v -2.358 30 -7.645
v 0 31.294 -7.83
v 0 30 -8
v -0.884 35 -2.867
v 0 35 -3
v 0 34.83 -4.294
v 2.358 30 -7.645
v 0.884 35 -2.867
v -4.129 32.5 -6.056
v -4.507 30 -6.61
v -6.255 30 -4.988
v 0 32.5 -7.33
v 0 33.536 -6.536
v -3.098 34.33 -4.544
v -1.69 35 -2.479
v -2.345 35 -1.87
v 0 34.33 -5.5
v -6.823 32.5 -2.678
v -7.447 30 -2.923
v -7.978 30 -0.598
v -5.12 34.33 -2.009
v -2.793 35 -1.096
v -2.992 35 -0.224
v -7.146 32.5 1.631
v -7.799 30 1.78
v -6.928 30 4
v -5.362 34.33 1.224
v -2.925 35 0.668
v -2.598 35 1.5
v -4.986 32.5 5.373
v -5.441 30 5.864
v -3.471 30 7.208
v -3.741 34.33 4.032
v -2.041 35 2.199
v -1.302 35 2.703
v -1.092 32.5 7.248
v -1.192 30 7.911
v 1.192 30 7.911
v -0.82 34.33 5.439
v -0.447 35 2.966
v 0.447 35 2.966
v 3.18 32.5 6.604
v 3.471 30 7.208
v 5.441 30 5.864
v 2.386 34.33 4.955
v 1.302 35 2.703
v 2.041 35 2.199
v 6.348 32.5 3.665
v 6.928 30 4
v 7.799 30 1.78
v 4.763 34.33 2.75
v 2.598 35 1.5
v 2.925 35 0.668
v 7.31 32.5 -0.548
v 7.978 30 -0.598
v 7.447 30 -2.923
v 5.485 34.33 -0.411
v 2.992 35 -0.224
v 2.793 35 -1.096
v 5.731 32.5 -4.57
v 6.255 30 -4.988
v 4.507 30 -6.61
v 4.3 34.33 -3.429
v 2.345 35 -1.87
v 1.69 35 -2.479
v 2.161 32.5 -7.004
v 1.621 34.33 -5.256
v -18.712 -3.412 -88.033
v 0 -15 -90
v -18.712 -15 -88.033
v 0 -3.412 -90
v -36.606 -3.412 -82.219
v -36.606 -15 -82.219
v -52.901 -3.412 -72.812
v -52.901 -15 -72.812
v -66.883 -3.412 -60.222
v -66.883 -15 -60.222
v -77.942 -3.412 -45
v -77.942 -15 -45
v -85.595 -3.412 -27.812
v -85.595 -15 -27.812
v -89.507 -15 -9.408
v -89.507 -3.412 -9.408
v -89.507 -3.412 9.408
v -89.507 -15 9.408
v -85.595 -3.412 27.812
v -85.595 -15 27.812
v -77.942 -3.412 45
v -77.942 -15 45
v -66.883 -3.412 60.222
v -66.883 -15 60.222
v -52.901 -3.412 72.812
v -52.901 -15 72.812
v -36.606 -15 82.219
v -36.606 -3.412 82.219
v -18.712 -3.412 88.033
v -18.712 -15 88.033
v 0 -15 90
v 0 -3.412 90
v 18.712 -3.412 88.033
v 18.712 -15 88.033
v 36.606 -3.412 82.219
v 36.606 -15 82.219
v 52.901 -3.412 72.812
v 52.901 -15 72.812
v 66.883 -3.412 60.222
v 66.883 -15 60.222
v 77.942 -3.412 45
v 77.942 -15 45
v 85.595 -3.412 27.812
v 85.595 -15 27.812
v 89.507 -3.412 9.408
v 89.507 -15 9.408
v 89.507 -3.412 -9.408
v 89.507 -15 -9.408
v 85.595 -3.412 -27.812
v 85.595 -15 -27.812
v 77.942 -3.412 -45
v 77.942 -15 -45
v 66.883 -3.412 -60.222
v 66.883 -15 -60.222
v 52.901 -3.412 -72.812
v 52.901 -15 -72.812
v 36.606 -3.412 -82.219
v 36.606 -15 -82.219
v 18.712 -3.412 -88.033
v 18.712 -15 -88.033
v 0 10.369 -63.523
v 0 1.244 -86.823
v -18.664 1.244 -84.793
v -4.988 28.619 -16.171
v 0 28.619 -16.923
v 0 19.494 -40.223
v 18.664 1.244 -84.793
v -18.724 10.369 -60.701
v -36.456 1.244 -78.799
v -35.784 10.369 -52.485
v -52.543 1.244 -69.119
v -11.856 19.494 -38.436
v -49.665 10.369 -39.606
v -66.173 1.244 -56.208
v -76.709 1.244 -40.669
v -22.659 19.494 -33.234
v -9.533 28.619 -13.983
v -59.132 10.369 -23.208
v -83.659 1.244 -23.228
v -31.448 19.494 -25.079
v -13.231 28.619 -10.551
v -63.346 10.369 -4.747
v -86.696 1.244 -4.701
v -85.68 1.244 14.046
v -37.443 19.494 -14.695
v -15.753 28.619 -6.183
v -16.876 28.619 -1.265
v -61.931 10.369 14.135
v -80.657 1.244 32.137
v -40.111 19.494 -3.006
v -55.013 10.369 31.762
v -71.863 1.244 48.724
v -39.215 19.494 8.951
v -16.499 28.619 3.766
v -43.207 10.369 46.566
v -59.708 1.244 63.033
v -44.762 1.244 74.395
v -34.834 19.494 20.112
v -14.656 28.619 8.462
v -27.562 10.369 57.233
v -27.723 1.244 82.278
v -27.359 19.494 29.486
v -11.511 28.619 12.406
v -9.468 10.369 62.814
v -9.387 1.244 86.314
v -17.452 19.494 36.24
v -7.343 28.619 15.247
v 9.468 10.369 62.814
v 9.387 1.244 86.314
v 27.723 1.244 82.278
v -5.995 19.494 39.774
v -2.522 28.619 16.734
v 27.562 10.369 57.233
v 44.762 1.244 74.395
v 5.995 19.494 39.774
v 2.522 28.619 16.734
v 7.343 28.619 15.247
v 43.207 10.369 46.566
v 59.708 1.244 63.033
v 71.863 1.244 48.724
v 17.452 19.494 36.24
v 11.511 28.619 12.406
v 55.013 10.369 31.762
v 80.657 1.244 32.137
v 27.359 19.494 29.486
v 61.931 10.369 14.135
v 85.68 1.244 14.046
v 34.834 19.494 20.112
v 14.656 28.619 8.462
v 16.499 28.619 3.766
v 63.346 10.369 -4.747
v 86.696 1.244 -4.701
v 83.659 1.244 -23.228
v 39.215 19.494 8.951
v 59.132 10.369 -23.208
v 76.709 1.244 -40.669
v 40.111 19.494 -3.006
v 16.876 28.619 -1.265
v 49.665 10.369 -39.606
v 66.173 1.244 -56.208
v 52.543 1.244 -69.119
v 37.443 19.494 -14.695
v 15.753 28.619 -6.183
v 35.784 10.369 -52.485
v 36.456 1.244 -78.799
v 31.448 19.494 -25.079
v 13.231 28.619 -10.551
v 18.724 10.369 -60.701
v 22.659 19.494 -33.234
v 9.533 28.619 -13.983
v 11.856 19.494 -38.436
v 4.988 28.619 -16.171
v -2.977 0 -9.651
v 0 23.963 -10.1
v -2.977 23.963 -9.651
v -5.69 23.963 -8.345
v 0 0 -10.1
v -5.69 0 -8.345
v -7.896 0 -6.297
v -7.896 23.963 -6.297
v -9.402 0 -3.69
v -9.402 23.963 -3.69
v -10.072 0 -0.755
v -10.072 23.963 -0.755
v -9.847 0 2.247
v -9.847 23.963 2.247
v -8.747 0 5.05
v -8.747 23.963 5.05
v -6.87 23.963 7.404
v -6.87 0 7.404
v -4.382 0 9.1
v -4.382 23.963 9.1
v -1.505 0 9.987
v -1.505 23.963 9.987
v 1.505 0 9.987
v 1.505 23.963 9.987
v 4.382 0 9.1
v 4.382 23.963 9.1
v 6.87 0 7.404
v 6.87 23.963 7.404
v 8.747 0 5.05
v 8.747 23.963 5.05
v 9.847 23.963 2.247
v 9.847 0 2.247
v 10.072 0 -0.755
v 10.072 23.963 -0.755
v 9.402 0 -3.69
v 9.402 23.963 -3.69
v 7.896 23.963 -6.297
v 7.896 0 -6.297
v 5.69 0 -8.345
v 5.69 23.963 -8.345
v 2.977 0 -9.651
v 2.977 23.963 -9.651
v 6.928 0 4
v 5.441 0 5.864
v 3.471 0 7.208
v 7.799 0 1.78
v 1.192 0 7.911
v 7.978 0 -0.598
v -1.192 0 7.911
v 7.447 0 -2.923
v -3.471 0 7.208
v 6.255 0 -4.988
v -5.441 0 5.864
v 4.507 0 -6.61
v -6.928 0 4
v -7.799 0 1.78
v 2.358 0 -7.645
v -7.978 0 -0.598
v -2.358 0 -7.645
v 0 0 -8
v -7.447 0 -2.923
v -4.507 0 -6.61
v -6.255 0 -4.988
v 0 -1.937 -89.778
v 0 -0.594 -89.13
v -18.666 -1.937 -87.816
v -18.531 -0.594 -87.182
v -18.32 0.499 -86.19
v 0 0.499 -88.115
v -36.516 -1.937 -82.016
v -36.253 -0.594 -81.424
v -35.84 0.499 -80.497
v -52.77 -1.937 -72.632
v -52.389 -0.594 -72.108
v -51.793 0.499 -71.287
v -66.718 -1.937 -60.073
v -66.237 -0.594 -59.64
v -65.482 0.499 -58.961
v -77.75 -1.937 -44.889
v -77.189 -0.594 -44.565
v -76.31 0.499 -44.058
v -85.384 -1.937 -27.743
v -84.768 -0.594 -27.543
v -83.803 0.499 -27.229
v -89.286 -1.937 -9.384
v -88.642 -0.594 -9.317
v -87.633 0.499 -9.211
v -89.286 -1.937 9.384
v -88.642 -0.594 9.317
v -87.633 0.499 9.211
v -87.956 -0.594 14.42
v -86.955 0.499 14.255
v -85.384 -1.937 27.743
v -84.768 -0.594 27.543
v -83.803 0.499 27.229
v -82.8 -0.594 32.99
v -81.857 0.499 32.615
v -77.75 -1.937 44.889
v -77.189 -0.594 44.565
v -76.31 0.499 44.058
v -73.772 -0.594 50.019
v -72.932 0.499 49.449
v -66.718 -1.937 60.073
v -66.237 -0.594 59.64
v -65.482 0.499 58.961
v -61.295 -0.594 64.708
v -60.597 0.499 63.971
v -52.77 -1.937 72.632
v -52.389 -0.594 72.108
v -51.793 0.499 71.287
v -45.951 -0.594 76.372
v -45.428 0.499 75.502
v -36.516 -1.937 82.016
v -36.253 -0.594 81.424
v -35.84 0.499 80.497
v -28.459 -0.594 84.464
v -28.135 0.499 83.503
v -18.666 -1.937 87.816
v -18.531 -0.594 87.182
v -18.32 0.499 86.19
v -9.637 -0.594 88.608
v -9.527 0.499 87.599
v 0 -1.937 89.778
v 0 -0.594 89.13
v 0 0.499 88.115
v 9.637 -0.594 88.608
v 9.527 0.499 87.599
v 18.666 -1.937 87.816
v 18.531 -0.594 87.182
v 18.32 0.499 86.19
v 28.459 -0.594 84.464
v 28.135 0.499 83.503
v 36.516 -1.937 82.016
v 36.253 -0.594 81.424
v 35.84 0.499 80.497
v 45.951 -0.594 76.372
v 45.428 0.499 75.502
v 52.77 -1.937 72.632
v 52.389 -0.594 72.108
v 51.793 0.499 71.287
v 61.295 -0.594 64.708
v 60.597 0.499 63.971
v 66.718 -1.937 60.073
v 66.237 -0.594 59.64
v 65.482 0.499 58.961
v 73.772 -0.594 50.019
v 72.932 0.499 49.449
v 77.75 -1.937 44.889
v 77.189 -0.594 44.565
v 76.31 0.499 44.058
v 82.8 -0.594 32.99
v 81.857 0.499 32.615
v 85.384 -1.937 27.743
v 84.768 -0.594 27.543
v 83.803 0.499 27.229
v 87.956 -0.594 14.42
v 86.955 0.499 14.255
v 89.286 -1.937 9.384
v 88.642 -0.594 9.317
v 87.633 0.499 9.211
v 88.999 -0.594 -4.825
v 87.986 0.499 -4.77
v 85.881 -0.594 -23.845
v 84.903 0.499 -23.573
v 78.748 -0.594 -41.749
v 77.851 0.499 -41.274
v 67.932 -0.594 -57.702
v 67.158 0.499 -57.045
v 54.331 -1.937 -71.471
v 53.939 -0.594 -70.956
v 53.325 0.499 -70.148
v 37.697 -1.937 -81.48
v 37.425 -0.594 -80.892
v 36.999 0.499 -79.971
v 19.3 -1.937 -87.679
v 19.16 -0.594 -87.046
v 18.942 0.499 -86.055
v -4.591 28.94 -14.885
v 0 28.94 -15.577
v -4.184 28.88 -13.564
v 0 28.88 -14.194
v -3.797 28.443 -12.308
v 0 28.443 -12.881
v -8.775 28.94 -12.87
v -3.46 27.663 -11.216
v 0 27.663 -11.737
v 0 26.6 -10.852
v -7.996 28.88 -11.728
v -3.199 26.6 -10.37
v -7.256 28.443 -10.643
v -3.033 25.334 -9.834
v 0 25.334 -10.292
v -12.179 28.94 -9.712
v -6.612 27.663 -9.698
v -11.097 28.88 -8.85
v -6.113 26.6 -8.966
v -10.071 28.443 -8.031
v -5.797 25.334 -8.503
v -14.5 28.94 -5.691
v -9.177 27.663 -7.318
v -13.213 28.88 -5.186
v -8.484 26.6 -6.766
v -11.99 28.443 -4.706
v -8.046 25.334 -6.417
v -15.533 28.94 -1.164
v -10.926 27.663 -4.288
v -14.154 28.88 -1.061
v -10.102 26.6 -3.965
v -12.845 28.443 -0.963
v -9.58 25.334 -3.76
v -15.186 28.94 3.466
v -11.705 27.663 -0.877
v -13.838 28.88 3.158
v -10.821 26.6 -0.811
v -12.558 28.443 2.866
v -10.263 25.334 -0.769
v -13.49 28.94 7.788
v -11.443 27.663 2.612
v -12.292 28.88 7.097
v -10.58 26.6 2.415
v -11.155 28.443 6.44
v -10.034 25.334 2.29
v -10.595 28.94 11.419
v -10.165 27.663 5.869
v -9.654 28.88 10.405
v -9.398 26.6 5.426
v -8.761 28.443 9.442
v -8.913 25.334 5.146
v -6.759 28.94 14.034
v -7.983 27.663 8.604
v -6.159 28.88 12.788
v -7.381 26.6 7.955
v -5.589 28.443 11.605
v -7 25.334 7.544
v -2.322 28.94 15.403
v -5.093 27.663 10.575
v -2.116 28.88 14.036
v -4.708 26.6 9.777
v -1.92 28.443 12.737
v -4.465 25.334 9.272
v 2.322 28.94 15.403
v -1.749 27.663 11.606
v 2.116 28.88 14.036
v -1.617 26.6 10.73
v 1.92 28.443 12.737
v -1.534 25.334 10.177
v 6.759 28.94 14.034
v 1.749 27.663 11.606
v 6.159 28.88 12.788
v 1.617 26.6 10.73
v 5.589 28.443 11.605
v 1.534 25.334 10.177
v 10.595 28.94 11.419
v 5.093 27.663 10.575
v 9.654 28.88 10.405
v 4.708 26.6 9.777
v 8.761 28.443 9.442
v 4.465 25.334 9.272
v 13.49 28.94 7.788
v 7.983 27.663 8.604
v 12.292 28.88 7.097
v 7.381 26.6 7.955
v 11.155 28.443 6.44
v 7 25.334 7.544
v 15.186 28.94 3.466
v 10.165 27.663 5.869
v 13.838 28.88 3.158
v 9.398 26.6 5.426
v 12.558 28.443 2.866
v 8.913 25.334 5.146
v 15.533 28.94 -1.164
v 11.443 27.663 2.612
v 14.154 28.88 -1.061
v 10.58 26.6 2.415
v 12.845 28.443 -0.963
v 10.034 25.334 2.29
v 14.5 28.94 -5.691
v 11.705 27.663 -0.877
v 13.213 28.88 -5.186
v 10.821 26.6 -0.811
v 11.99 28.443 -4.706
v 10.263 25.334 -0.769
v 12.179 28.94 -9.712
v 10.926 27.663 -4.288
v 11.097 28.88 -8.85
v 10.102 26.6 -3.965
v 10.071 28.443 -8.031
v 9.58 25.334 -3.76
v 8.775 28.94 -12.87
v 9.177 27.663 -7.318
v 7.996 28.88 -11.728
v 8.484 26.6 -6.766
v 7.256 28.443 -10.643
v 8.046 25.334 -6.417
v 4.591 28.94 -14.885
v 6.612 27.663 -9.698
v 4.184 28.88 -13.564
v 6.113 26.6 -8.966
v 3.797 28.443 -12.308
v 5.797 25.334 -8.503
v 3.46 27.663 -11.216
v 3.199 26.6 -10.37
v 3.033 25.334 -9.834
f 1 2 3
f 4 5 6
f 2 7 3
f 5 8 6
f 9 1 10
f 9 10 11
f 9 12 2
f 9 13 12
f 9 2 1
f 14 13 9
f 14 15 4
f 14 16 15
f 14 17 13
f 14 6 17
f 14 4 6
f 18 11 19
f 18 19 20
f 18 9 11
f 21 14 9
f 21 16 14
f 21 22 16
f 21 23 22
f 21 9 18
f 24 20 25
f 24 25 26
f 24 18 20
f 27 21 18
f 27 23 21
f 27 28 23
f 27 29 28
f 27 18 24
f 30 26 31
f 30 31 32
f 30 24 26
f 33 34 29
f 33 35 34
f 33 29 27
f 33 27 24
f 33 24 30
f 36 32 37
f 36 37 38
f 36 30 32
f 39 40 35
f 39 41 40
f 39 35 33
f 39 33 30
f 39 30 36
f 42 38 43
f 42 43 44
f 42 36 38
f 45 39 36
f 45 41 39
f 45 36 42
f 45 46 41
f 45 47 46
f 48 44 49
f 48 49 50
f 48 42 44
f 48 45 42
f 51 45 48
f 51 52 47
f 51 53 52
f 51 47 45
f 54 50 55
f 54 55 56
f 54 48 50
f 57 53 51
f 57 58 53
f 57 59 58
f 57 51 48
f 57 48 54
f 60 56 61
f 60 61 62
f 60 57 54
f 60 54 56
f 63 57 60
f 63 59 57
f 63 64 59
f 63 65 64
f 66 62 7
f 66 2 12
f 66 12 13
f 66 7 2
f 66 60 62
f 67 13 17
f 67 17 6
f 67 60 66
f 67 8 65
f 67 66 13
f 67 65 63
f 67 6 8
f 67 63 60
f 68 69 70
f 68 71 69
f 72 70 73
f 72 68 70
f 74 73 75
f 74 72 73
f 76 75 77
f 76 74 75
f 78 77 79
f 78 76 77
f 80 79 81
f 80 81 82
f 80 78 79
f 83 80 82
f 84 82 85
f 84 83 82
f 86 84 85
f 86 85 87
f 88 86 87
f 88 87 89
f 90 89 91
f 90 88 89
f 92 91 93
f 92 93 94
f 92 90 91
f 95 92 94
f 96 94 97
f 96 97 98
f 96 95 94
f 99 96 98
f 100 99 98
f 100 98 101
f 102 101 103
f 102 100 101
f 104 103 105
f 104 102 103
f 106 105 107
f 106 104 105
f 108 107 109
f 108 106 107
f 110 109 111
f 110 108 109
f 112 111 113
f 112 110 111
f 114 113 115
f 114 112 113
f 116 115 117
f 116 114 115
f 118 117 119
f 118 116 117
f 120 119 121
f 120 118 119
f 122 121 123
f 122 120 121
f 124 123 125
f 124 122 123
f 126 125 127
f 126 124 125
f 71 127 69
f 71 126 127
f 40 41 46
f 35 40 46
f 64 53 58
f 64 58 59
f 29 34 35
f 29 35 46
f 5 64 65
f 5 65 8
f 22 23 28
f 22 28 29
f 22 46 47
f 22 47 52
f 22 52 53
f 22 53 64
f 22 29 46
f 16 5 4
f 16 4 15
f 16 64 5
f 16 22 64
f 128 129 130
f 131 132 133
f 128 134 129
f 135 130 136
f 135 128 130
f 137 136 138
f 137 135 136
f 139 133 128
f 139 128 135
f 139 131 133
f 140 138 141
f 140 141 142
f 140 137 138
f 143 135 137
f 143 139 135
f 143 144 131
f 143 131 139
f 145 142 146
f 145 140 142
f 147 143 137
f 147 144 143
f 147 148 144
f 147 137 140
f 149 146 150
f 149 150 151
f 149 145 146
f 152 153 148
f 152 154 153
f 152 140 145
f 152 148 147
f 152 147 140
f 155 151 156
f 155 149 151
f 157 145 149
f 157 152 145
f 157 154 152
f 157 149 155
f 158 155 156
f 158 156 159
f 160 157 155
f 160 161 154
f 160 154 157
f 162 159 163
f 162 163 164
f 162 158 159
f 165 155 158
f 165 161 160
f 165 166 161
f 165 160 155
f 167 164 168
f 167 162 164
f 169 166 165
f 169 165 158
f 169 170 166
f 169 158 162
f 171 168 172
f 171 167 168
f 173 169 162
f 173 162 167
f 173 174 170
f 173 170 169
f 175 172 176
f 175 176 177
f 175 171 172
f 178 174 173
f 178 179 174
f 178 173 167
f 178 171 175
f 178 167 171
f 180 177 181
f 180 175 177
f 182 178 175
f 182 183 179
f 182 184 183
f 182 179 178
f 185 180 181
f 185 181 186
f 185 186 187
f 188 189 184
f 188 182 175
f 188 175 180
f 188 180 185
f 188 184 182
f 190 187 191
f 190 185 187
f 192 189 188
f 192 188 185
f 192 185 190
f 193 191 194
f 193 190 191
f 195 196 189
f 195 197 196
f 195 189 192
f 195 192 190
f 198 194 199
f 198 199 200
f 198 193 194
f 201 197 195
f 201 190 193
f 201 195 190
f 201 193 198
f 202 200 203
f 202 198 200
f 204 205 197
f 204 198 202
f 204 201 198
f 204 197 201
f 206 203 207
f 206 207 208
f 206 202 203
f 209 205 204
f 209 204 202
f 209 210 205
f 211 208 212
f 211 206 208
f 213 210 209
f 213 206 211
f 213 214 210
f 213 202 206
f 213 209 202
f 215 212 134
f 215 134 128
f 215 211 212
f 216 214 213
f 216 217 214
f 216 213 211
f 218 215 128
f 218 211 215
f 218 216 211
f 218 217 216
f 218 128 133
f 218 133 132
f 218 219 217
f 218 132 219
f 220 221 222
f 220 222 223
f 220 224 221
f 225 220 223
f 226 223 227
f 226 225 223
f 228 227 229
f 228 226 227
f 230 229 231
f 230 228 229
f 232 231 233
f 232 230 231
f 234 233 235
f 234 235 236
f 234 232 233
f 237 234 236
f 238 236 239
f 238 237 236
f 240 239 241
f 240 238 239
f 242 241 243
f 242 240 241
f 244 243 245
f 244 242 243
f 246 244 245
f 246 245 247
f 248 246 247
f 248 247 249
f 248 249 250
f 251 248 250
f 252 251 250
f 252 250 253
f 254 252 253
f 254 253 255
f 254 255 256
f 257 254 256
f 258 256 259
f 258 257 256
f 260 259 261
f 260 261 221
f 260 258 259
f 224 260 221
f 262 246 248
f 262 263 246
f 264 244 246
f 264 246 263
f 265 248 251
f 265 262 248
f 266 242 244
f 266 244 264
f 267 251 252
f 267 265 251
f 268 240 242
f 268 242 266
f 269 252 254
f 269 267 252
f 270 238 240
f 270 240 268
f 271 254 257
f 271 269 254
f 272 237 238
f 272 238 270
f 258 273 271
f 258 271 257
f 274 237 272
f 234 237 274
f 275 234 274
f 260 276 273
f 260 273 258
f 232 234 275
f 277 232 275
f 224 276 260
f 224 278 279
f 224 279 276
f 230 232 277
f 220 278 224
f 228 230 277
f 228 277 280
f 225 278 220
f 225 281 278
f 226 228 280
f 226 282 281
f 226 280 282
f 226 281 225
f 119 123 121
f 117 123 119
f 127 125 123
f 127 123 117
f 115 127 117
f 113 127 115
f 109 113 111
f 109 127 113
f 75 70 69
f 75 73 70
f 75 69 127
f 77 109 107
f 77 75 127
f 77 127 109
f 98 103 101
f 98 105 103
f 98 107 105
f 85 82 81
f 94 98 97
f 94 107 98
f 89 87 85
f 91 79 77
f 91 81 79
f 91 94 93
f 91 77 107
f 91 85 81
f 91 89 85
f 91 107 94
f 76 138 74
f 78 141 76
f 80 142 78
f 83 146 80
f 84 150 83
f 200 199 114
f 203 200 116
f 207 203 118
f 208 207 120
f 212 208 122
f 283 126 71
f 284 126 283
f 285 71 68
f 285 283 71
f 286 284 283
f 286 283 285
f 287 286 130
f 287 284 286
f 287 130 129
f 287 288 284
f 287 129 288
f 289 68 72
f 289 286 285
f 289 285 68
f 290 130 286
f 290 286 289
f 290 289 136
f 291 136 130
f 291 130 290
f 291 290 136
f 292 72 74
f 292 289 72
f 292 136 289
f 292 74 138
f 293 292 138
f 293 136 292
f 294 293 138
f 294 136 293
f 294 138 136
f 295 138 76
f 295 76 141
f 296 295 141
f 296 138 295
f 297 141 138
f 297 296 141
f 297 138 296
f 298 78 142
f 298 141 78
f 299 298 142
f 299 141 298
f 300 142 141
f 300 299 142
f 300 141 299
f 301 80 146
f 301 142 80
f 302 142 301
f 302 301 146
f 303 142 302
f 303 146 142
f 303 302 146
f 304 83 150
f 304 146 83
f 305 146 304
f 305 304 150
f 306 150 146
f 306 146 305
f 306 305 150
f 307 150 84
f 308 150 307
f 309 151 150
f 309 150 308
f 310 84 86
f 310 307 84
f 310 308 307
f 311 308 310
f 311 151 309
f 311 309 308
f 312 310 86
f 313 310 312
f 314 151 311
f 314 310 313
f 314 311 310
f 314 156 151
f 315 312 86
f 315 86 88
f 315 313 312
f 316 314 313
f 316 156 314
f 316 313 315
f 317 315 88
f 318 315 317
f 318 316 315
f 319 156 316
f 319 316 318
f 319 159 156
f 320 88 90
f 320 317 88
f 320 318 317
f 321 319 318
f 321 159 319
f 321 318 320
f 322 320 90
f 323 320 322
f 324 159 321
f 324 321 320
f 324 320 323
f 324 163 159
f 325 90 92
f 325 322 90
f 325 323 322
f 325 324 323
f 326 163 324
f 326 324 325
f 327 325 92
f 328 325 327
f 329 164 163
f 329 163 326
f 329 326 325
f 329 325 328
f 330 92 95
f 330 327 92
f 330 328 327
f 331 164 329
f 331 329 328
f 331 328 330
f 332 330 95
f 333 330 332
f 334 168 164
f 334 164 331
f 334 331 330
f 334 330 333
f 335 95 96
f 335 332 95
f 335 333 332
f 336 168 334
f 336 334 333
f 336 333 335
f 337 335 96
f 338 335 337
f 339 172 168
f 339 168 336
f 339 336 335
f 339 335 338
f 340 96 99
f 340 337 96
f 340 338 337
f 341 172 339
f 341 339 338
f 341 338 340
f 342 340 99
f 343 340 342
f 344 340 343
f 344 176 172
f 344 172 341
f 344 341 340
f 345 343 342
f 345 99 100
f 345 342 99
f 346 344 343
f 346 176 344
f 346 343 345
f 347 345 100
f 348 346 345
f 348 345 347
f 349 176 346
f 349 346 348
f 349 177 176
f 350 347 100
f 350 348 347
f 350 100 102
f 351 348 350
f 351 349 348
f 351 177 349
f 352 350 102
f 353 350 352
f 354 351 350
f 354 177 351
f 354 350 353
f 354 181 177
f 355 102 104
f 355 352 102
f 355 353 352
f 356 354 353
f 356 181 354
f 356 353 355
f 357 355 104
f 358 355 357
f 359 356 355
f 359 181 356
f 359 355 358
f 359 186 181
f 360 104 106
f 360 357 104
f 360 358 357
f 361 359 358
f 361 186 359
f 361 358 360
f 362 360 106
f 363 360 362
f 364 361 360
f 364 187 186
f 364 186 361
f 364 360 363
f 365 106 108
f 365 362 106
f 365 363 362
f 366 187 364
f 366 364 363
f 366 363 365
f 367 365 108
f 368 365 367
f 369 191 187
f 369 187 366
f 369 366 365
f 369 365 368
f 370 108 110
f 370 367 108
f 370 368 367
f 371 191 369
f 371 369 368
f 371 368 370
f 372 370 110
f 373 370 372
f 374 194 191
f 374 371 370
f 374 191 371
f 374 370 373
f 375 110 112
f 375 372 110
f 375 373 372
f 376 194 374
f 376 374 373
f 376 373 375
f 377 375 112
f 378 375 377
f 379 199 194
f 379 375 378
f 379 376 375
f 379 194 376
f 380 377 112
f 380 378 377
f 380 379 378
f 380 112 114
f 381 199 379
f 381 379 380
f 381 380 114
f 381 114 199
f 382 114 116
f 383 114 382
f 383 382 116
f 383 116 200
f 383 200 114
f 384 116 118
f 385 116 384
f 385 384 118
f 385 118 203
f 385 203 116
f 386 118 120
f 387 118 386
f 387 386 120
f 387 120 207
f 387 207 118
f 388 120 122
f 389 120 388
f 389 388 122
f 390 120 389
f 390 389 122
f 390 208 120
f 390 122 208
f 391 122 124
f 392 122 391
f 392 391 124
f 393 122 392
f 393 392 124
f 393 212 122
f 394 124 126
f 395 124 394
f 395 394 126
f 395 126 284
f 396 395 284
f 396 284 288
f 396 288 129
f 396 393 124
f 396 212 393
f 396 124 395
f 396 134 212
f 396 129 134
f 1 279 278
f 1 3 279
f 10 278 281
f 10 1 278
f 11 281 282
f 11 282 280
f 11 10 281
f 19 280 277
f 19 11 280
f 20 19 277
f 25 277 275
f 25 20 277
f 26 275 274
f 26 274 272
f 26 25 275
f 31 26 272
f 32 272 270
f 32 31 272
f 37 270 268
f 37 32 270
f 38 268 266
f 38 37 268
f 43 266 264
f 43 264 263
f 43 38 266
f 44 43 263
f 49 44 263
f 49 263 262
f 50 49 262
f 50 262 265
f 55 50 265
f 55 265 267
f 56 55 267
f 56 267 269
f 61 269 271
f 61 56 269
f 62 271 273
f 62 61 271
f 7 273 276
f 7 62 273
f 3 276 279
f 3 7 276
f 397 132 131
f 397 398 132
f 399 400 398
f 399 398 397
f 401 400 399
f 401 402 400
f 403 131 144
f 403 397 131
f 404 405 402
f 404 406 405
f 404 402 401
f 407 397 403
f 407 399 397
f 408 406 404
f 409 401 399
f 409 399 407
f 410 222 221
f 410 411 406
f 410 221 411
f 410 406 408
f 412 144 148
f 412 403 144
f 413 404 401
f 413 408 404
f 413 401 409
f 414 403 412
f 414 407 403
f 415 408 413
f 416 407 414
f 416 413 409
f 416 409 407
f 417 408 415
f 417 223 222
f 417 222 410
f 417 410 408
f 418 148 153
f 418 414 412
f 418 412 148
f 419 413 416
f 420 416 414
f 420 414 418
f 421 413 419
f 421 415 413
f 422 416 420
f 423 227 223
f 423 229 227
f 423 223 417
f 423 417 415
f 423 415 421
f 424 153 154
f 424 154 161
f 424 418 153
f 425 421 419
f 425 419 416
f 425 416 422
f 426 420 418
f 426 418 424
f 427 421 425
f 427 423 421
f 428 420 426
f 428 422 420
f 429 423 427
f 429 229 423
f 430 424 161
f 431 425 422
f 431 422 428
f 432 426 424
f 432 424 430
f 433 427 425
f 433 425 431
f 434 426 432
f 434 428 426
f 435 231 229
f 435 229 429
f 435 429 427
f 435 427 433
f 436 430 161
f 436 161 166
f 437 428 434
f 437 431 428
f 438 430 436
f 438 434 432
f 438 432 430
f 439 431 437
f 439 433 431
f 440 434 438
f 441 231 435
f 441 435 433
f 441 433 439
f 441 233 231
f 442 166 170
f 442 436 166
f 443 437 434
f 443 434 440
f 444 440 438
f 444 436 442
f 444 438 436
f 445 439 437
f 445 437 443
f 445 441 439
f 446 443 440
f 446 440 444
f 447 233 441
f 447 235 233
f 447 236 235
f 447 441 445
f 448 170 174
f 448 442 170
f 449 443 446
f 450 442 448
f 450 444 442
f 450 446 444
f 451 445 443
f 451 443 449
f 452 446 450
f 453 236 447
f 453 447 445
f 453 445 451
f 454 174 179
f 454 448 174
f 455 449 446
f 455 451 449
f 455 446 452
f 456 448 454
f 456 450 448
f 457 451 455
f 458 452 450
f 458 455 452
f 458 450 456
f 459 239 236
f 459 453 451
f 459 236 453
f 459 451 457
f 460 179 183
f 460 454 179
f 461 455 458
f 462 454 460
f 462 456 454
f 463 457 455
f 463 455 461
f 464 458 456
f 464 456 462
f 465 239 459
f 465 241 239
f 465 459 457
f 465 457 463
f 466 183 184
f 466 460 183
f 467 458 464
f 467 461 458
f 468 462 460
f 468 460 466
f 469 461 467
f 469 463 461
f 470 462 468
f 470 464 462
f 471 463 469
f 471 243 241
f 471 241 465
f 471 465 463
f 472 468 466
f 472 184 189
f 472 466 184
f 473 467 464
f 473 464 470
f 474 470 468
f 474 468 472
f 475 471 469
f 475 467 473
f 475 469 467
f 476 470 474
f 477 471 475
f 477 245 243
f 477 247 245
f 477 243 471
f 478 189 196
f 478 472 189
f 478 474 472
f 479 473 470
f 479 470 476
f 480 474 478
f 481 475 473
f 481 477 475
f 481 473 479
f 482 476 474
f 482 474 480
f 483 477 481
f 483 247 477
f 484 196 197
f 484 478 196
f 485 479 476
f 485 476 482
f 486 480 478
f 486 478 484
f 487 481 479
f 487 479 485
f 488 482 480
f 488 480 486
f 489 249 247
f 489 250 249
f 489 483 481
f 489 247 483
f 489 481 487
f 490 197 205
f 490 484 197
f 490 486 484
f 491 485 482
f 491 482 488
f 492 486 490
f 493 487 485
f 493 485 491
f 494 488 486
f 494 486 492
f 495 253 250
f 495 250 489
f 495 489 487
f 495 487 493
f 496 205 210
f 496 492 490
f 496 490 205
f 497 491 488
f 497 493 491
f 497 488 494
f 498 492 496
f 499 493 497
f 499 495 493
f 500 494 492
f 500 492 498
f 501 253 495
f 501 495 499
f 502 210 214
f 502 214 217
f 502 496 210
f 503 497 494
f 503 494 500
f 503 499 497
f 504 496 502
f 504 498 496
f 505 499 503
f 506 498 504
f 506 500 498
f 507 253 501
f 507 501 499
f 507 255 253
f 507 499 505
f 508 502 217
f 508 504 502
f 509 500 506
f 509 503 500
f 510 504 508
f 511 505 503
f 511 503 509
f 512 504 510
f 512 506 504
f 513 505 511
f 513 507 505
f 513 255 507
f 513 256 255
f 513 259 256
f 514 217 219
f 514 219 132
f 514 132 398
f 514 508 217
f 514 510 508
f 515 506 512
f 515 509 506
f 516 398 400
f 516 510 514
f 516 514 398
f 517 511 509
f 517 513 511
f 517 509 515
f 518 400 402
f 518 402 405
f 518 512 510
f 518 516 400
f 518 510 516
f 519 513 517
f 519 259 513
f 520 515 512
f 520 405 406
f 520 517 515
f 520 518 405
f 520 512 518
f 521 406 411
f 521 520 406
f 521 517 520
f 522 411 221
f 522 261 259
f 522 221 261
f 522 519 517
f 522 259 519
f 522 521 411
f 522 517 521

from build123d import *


with BuildPart() as part:
    # 草图3 → 旋转1 (revolve)
    with BuildSketch(Plane.XY, mode=Mode.PRIVATE) as revolve_1_sk:
        with BuildLine():
            Line((90, -15), (90, -3.411628169))
            ThreePointArc((90, -3.411628169), (89.130160961, -0.593513474), (86.823291826, 1.24407875))
            Line((86.823291826, 1.24407875), (16.923291826, 28.61867531))
            ThreePointArc((16.923291826, 28.61867531), (12.281885305, 28.093129351), (10.1, 23.96296839))
            Line((10.1, 23.96296839), (10.1, 0))
            Line((10.1, 0), (8, 0))
            Line((8, 0), (8, 30))
            ThreePointArc((8, 30), (6.535533906, 33.535533906), (3, 35))
            Line((3, 35), (0, 35))
            Line((0, 35), (0, 0))
            Line((0, 0), (0, -15))
            Line((0, -15), (90, -15))
        make_face()
    revolve(revolve_1_sk.sketch.rotate(Axis((0, 0, 0), (0, 1, 0)), 90), axis=Axis((0, 0, 0), (0, 1, 0)))


solid = part.part
